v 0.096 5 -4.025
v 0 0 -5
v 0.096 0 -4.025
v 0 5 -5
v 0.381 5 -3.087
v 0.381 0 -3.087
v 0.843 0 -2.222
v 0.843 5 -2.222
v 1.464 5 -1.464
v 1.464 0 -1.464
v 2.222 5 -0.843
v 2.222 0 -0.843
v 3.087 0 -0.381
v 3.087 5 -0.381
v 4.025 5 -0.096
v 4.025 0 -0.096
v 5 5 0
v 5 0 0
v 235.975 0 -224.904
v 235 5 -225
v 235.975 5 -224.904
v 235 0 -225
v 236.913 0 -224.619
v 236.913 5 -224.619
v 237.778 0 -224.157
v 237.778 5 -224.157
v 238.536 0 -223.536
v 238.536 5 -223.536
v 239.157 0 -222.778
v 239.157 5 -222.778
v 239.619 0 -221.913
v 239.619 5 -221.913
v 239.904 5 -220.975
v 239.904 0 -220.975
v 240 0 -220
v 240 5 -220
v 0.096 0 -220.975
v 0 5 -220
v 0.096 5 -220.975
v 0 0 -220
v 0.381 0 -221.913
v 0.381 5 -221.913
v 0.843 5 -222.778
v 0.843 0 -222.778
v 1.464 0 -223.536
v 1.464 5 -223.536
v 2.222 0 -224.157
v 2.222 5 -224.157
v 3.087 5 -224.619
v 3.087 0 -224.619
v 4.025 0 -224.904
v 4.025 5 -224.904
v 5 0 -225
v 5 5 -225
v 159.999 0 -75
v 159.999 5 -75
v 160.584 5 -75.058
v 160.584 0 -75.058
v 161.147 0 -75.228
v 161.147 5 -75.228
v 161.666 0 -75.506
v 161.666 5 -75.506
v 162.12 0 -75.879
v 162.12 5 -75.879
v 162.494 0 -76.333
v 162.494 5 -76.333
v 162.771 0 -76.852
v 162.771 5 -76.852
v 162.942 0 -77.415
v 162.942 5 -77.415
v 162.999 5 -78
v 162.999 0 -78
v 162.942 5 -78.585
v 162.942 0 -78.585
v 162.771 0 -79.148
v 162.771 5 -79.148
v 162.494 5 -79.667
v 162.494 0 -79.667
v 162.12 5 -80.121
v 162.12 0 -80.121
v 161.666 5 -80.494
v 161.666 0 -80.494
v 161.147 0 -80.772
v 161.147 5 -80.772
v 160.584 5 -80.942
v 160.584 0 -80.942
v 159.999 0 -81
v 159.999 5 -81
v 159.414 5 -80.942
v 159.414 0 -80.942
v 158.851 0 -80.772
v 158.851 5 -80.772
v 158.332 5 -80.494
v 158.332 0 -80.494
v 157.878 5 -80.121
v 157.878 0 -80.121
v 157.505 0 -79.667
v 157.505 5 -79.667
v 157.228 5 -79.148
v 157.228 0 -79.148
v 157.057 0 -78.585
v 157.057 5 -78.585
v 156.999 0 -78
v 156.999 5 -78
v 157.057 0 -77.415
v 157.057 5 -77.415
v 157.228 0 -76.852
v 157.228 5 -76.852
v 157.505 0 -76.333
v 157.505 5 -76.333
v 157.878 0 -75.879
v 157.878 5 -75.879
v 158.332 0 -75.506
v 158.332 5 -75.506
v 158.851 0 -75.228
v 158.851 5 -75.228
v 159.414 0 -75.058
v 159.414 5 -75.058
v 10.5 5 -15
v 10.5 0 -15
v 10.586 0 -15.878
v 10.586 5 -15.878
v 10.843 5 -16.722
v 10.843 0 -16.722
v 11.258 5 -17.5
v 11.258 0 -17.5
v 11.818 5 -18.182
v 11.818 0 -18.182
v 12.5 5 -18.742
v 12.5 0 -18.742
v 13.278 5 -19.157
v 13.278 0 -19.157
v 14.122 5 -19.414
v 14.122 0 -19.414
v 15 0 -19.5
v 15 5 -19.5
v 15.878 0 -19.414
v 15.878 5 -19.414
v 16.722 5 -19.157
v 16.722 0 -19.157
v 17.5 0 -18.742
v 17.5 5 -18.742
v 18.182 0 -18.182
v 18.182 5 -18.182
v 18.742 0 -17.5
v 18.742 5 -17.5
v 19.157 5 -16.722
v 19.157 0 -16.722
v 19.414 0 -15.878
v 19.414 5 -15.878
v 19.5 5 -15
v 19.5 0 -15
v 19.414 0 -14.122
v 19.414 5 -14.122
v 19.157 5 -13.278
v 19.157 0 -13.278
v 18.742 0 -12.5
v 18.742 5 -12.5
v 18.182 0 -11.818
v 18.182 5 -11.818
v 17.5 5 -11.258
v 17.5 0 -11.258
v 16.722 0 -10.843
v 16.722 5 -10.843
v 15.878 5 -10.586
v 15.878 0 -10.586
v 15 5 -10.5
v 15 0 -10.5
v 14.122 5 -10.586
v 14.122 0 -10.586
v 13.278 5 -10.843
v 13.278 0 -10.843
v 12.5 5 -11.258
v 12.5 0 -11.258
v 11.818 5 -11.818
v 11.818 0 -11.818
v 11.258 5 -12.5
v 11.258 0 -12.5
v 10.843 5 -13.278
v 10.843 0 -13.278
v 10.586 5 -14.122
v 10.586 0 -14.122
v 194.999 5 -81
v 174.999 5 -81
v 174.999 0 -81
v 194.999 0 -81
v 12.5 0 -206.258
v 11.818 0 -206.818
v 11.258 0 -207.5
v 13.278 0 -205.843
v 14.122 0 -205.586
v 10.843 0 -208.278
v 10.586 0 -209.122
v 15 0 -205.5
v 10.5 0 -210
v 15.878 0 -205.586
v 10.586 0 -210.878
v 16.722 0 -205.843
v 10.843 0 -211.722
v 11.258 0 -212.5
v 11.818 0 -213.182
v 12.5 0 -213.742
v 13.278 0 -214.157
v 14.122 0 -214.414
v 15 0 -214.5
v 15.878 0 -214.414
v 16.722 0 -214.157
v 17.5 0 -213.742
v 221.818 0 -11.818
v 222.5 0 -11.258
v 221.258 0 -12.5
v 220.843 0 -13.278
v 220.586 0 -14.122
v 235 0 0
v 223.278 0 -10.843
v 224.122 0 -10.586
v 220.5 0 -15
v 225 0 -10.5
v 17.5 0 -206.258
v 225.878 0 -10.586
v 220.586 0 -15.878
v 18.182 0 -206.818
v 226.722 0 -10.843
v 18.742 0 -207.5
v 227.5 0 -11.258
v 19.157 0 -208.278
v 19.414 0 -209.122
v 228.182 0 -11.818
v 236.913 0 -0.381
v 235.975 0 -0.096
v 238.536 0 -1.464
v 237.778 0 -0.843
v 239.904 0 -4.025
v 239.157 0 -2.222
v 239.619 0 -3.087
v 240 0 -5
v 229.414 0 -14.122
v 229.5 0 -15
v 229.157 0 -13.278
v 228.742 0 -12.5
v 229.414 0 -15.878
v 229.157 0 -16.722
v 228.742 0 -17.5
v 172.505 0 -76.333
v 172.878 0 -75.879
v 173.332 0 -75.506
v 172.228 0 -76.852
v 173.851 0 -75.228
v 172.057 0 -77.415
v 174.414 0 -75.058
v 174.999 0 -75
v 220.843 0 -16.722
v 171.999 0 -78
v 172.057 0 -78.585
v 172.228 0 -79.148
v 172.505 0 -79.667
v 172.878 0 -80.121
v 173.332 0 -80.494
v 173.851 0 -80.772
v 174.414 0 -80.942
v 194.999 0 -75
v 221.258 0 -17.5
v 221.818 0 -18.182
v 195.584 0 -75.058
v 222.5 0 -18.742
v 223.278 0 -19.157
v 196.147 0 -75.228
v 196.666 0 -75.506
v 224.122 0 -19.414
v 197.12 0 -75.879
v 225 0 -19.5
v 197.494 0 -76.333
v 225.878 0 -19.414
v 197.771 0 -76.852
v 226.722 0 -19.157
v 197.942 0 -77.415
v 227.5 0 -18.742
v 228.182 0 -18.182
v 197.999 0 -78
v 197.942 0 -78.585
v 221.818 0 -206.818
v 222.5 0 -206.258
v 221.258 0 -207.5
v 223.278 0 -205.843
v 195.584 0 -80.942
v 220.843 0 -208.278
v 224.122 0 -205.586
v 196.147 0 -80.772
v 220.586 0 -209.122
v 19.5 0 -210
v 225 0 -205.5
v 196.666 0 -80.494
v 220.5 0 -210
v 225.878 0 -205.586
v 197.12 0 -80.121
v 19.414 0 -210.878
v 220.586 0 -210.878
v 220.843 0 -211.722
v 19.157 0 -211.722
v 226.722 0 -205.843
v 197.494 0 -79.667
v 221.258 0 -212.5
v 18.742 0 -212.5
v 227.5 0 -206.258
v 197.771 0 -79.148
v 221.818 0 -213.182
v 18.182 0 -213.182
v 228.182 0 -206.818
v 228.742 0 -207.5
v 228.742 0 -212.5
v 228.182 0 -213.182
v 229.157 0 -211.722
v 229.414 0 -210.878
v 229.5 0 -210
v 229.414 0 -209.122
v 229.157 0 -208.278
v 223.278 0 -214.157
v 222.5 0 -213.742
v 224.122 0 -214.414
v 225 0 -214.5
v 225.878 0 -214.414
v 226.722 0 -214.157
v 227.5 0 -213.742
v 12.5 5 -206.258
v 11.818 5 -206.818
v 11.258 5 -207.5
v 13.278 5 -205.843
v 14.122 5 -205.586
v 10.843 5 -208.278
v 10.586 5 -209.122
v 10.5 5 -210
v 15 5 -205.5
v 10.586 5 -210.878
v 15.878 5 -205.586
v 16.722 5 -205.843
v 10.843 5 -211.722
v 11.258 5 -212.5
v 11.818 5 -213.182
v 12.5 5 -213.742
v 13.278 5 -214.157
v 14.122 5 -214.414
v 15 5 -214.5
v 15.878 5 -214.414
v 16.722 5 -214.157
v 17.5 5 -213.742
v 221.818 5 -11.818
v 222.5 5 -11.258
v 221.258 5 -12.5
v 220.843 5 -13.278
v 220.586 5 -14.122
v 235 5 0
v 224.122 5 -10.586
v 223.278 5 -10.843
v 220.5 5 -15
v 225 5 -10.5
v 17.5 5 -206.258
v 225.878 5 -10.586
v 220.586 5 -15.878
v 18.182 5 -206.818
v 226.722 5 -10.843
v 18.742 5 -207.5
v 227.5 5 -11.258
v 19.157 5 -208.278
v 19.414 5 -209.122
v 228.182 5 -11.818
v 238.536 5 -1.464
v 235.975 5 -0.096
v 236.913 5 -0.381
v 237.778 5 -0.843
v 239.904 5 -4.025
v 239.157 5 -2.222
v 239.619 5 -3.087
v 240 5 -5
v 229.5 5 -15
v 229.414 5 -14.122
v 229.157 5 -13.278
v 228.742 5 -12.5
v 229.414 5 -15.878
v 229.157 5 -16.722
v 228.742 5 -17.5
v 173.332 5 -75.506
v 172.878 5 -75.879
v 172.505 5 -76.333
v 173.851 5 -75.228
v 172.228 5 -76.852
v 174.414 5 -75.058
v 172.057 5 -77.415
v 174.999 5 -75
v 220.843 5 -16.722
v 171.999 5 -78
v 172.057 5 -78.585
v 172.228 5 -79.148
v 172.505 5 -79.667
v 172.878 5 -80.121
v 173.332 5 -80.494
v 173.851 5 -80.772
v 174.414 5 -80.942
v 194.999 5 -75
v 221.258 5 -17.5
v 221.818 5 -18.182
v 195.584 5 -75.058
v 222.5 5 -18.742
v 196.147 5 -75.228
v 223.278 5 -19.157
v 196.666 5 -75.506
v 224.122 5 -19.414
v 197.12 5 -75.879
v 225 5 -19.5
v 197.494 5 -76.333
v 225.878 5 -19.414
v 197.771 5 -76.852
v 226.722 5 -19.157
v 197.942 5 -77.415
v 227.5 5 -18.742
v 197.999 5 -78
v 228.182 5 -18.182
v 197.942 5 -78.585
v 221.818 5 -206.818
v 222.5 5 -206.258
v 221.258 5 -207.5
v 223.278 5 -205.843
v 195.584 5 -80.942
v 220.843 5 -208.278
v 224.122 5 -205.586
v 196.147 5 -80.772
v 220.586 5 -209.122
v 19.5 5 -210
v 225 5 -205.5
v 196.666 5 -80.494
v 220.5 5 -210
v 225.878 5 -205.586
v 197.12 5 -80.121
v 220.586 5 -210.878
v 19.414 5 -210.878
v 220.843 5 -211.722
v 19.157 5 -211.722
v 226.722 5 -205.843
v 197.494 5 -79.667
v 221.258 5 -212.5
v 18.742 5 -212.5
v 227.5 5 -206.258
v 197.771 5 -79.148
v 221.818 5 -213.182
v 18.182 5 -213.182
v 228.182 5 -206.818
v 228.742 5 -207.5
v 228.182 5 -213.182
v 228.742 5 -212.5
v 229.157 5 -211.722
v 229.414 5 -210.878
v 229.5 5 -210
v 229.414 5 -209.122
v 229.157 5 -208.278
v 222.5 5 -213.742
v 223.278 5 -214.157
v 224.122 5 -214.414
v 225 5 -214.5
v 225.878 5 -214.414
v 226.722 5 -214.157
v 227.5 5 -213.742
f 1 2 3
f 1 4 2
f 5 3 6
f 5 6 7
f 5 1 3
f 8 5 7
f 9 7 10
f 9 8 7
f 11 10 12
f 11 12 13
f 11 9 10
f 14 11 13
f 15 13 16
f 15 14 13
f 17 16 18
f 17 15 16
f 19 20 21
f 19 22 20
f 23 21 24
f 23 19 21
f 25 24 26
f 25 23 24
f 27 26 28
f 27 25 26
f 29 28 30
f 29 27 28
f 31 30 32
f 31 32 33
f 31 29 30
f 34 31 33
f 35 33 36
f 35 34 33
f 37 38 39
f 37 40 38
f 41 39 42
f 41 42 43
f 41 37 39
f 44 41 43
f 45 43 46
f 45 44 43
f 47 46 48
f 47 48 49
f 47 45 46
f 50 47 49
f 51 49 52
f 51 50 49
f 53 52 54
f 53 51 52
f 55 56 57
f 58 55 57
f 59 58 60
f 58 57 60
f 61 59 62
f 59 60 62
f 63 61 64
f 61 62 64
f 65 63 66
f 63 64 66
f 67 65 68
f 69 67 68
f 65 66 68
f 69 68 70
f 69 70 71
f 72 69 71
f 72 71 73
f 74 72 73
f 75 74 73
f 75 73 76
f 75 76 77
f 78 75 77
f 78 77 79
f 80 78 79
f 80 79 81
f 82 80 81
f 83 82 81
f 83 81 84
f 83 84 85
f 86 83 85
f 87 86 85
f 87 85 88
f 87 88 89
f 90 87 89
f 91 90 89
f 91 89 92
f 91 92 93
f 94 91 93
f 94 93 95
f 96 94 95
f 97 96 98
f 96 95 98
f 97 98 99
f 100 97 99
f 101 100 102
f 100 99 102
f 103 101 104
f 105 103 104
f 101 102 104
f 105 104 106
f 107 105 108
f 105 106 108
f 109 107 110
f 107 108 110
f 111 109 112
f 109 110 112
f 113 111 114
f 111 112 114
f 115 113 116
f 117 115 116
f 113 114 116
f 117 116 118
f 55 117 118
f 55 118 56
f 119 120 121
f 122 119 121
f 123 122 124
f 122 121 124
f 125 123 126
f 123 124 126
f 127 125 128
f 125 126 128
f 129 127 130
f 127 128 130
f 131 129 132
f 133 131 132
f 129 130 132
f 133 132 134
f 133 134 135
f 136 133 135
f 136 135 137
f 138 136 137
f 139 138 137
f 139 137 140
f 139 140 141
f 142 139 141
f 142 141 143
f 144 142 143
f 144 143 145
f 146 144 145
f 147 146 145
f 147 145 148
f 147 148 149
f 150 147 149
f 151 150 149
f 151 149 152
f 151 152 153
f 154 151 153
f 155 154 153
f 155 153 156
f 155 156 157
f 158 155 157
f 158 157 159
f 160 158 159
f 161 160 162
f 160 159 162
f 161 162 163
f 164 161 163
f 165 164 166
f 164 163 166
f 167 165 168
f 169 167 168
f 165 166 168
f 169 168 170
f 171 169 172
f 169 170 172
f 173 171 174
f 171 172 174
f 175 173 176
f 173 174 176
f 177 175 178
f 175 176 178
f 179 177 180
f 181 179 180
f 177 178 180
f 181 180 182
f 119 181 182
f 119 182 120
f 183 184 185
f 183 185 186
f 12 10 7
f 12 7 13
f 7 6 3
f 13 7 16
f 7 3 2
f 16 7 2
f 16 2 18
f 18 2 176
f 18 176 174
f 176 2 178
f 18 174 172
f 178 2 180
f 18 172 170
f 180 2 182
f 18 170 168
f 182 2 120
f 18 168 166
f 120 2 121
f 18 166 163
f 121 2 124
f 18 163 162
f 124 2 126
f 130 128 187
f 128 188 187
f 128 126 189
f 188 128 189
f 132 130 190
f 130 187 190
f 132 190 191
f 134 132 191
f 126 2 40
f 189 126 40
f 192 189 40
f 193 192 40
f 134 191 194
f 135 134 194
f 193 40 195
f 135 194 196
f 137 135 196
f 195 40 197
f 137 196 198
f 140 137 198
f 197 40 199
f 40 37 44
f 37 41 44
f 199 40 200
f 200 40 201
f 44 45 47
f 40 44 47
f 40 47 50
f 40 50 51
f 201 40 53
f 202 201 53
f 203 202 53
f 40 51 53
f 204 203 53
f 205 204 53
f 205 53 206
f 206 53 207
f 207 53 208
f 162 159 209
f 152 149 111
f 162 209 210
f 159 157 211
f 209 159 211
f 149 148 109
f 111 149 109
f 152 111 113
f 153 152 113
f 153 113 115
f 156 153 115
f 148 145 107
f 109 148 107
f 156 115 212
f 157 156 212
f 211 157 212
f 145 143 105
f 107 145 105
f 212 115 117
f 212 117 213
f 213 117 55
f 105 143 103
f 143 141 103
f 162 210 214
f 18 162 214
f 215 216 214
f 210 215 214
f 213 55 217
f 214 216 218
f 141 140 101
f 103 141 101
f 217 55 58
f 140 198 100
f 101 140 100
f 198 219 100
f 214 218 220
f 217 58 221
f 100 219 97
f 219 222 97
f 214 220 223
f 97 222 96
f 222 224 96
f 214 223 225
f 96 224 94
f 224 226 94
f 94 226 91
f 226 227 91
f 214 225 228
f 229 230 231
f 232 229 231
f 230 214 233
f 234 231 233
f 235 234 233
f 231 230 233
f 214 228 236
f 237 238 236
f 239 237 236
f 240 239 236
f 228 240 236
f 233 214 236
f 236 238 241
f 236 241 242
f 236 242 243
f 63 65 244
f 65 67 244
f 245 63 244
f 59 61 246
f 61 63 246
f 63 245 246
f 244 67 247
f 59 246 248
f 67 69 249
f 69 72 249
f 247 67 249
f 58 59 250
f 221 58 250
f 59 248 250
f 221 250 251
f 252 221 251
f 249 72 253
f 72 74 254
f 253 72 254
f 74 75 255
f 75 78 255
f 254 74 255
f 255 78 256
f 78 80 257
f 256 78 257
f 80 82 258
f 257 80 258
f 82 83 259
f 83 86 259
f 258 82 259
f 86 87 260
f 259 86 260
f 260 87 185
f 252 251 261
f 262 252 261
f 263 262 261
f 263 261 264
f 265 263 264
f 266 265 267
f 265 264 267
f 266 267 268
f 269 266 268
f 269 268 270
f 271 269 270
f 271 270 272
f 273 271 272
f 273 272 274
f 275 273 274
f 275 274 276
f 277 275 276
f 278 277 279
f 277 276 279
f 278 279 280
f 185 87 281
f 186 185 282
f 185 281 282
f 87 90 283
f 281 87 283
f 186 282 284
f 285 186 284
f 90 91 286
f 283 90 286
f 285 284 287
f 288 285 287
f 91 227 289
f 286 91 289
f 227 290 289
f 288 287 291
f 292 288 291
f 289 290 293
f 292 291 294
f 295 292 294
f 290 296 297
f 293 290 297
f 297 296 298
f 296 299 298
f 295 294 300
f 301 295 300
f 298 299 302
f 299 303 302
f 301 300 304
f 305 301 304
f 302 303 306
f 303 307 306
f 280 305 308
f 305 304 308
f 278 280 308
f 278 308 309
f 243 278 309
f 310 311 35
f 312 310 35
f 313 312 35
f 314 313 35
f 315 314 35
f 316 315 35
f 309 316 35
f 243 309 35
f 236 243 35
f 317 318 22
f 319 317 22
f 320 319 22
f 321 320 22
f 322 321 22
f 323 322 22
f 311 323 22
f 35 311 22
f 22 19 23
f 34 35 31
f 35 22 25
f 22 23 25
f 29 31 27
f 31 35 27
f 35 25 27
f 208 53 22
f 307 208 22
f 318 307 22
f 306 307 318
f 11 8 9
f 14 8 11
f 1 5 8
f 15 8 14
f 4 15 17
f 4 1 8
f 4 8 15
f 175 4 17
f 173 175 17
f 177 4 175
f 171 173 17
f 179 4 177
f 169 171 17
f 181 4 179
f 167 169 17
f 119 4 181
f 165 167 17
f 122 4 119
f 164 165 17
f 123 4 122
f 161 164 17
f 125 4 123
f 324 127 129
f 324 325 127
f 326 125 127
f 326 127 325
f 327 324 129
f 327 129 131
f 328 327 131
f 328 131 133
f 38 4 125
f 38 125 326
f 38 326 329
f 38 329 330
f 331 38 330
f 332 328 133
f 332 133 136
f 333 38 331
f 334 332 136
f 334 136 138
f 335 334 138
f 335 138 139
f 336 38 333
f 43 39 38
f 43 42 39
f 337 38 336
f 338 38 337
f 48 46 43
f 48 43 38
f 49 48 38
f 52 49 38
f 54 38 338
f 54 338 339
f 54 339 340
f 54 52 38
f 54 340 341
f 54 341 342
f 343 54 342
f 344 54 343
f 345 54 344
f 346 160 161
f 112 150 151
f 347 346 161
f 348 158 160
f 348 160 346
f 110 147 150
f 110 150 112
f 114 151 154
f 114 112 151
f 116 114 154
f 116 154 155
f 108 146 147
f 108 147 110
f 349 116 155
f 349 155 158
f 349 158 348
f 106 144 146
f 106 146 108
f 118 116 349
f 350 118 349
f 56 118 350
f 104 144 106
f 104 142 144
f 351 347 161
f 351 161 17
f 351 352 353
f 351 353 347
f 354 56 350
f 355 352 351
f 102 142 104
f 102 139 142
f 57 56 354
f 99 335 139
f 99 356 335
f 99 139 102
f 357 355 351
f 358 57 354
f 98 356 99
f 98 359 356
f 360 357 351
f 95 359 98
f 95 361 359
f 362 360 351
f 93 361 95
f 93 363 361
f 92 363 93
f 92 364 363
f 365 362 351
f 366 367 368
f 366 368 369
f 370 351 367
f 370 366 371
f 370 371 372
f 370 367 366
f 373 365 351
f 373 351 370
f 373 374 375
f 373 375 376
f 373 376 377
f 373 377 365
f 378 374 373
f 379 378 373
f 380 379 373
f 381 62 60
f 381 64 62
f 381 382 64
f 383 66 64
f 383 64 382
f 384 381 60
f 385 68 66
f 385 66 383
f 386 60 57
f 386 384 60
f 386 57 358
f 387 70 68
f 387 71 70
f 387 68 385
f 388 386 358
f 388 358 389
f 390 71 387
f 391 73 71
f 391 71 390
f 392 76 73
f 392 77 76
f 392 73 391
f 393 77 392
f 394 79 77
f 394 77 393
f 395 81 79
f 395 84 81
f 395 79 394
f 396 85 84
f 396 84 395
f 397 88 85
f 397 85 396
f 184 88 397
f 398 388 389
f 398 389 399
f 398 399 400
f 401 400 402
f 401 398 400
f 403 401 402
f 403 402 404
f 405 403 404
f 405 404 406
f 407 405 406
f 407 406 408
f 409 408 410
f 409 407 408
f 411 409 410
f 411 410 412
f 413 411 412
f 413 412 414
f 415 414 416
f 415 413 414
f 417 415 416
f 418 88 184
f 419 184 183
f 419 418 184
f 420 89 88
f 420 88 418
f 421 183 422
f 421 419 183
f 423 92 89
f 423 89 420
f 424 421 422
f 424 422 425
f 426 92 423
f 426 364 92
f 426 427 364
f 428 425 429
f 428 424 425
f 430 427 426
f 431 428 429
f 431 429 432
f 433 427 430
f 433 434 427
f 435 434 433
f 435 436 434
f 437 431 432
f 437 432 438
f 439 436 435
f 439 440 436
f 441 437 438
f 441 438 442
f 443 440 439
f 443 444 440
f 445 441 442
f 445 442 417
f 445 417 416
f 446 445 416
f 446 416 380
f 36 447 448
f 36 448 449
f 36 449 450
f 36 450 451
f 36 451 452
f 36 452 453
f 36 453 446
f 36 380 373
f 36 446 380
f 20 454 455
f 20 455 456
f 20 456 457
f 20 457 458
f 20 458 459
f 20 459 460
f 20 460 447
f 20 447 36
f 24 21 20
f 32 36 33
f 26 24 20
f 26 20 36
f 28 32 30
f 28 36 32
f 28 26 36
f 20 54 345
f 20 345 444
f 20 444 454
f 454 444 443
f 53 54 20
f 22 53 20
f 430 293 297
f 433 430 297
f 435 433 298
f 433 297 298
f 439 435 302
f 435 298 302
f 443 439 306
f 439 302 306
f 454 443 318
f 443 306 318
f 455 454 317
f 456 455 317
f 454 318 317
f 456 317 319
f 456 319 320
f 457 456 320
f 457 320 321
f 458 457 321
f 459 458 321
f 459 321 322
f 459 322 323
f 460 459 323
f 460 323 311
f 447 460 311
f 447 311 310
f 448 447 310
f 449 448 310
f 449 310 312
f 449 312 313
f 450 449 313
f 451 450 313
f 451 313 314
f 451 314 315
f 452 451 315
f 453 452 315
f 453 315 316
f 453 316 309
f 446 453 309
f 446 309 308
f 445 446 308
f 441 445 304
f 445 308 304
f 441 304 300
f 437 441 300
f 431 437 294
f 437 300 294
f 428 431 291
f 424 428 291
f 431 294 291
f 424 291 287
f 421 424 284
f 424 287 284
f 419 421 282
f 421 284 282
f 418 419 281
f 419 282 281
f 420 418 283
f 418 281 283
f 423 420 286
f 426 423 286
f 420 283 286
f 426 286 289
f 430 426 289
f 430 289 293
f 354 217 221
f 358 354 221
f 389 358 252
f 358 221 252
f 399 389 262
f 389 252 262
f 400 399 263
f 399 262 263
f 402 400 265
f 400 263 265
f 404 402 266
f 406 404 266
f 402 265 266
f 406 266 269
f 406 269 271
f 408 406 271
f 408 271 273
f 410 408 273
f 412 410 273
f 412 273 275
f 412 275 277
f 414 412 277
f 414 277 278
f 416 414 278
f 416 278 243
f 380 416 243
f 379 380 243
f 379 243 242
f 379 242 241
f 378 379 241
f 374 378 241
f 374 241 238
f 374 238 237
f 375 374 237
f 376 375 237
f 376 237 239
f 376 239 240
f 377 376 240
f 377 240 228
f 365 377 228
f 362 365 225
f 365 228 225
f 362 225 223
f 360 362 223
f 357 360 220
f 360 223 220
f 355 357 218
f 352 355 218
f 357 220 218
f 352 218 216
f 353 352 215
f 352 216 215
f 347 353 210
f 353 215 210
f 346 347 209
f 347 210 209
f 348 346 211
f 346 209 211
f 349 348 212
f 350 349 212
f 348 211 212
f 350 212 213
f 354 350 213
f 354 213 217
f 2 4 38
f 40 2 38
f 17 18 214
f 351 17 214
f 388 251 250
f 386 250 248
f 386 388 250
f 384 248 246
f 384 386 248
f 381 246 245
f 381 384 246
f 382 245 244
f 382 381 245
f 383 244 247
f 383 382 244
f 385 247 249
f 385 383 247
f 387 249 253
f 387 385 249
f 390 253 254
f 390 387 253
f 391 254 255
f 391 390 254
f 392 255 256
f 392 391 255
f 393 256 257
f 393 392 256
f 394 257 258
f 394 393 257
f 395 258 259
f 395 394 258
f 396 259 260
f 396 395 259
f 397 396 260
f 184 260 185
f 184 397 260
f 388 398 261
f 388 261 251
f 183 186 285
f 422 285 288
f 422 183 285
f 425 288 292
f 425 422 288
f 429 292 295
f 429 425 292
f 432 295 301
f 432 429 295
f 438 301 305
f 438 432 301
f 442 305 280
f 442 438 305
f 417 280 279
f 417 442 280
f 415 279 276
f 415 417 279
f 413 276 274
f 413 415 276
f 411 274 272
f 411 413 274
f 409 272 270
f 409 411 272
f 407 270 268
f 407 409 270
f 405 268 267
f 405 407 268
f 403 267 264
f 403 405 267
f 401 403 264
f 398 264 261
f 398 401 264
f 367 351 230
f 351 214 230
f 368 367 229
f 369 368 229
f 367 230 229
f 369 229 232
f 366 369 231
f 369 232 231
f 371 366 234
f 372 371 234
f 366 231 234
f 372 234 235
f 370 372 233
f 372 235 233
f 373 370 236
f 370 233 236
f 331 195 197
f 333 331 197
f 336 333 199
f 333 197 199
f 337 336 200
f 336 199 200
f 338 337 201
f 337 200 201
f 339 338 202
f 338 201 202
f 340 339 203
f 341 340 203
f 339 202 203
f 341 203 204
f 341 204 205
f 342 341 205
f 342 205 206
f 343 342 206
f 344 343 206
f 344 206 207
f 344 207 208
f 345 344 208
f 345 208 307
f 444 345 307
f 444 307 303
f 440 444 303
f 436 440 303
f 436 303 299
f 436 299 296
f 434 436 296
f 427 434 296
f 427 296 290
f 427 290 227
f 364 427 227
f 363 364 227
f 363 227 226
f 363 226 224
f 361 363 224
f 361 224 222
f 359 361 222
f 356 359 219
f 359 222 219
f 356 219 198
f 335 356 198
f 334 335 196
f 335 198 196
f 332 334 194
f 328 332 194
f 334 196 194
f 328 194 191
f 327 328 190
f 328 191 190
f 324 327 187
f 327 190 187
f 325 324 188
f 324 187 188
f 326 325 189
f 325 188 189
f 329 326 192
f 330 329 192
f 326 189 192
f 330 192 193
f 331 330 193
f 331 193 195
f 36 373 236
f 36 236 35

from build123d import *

# Parameters (mm, degrees)
SKETCH1_W                = 350
SKETCH1_H                = 200
BOSS_EXTRUDE1_DEPTH      = 5
M4_CLEARANCE_HOLE2_D     = 4.5
M4_CLEARANCE_HOLE2_DEPTH = 10
M4_CLEARANCE_HOLE2_TIP   = 1.351936393
SKETCH8_R                = 3
CUT_EXTRUDE2_DEPTH       = 404.143894906
SKETCH10_W               = 110
SKETCH10_H               = 200
CUT_EXTRUDE4_DEPTH       = 404.143894906
SKETCH11_W               = 240
SKETCH11_H               = 25
BOSS_EXTRUDE2_DEPTH      = 5
M8_CLEARANCE_HOLE1_D     = 9
FILLET3_R                = 5


with BuildPart() as part:
    # Sketch1 → Boss-Extrude1 (new body)
    with BuildSketch(Plane(origin=(0, 0, 0), x_dir=(1, 0, 0), z_dir=(0, 1, 0))):
        with Locations((175, 100)):
            Rectangle(SKETCH1_W, SKETCH1_H)
    extrude(amount=BOSS_EXTRUDE1_DEPTH)

    # M4 Clearance Hole2
    with Locations(Plane(origin=(0, 5, 0), x_dir=(1, 0, 0), z_dir=(0, 1, 0))):
        with Locations((279.726995352, 76.5), (279.726995352, 123.5), (303.226995352, 100), (256.226995352, 100)):
            Hole(M4_CLEARANCE_HOLE2_D / 2, depth=M4_CLEARANCE_HOLE2_DEPTH)
            with Locations((0, 0, -(M4_CLEARANCE_HOLE2_DEPTH + M4_CLEARANCE_HOLE2_TIP / 2))):  # 118° drill point
                Cone(0, M4_CLEARANCE_HOLE2_D / 2, M4_CLEARANCE_HOLE2_TIP, mode=Mode.SUBTRACT)

    # Sketch8 → Cut-Extrude2 (cut, through all)
    with BuildSketch(Plane(origin=(0, 5, 0), x_dir=(1, 0, 0), z_dir=(0, 1, 0))):
        with Locations(Location((159.999156247, 78, 0), (0, 0, 270))):
            Circle(SKETCH8_R)
        with BuildLine():
            Line((174.999156247, 81), (194.999156247, 81))
            ThreePointArc((194.999156247, 81), (197.999156247, 78), (194.999156247, 75))
            Line((194.999156247, 75), (174.999156247, 75))
            ThreePointArc((174.999156247, 75), (171.999156247, 78), (174.999156247, 81))
        make_face()
    extrude(amount=-CUT_EXTRUDE2_DEPTH, mode=Mode.SUBTRACT)

    # Sketch10 → Cut-Extrude4 (cut, through all)
    with BuildSketch(Plane(origin=(0, 5, 0), x_dir=(1, 0, 0), z_dir=(0, 1, 0))):
        with Locations((295, 100)):
            Rectangle(SKETCH10_W, SKETCH10_H)
    extrude(amount=-CUT_EXTRUDE4_DEPTH, mode=Mode.SUBTRACT)

    # Sketch11 → Boss-Extrude2 (add)
    with BuildSketch(Plane(origin=(0, 5, 0), x_dir=(1, 0, 0), z_dir=(0, 1, 0))):
        with Locations((120, 212.5)):
            Rectangle(SKETCH11_W, SKETCH11_H)
    extrude(amount=-BOSS_EXTRUDE2_DEPTH)

    # M8 Clearance Hole1 (through all)
    with Locations(Plane(origin=(0, 5, 0), x_dir=(1, 0, 0), z_dir=(0, 1, 0))):
        with Locations((15, 15), (225, 15), (225, 210), (15, 210)):
            Hole(M8_CLEARANCE_HOLE1_D / 2)

    # Fillet3
    fillet3_edges = [part.edges().sort_by_distance(p)[0] for p in [
        (240, 2.5, 0),
        (0, 2.5, 0),
        (0, 2.5, -225),
        (240, 2.5, -225),
    ]]
    fillet(fillet3_edges, radius=FILLET3_R)


solid = part.part
